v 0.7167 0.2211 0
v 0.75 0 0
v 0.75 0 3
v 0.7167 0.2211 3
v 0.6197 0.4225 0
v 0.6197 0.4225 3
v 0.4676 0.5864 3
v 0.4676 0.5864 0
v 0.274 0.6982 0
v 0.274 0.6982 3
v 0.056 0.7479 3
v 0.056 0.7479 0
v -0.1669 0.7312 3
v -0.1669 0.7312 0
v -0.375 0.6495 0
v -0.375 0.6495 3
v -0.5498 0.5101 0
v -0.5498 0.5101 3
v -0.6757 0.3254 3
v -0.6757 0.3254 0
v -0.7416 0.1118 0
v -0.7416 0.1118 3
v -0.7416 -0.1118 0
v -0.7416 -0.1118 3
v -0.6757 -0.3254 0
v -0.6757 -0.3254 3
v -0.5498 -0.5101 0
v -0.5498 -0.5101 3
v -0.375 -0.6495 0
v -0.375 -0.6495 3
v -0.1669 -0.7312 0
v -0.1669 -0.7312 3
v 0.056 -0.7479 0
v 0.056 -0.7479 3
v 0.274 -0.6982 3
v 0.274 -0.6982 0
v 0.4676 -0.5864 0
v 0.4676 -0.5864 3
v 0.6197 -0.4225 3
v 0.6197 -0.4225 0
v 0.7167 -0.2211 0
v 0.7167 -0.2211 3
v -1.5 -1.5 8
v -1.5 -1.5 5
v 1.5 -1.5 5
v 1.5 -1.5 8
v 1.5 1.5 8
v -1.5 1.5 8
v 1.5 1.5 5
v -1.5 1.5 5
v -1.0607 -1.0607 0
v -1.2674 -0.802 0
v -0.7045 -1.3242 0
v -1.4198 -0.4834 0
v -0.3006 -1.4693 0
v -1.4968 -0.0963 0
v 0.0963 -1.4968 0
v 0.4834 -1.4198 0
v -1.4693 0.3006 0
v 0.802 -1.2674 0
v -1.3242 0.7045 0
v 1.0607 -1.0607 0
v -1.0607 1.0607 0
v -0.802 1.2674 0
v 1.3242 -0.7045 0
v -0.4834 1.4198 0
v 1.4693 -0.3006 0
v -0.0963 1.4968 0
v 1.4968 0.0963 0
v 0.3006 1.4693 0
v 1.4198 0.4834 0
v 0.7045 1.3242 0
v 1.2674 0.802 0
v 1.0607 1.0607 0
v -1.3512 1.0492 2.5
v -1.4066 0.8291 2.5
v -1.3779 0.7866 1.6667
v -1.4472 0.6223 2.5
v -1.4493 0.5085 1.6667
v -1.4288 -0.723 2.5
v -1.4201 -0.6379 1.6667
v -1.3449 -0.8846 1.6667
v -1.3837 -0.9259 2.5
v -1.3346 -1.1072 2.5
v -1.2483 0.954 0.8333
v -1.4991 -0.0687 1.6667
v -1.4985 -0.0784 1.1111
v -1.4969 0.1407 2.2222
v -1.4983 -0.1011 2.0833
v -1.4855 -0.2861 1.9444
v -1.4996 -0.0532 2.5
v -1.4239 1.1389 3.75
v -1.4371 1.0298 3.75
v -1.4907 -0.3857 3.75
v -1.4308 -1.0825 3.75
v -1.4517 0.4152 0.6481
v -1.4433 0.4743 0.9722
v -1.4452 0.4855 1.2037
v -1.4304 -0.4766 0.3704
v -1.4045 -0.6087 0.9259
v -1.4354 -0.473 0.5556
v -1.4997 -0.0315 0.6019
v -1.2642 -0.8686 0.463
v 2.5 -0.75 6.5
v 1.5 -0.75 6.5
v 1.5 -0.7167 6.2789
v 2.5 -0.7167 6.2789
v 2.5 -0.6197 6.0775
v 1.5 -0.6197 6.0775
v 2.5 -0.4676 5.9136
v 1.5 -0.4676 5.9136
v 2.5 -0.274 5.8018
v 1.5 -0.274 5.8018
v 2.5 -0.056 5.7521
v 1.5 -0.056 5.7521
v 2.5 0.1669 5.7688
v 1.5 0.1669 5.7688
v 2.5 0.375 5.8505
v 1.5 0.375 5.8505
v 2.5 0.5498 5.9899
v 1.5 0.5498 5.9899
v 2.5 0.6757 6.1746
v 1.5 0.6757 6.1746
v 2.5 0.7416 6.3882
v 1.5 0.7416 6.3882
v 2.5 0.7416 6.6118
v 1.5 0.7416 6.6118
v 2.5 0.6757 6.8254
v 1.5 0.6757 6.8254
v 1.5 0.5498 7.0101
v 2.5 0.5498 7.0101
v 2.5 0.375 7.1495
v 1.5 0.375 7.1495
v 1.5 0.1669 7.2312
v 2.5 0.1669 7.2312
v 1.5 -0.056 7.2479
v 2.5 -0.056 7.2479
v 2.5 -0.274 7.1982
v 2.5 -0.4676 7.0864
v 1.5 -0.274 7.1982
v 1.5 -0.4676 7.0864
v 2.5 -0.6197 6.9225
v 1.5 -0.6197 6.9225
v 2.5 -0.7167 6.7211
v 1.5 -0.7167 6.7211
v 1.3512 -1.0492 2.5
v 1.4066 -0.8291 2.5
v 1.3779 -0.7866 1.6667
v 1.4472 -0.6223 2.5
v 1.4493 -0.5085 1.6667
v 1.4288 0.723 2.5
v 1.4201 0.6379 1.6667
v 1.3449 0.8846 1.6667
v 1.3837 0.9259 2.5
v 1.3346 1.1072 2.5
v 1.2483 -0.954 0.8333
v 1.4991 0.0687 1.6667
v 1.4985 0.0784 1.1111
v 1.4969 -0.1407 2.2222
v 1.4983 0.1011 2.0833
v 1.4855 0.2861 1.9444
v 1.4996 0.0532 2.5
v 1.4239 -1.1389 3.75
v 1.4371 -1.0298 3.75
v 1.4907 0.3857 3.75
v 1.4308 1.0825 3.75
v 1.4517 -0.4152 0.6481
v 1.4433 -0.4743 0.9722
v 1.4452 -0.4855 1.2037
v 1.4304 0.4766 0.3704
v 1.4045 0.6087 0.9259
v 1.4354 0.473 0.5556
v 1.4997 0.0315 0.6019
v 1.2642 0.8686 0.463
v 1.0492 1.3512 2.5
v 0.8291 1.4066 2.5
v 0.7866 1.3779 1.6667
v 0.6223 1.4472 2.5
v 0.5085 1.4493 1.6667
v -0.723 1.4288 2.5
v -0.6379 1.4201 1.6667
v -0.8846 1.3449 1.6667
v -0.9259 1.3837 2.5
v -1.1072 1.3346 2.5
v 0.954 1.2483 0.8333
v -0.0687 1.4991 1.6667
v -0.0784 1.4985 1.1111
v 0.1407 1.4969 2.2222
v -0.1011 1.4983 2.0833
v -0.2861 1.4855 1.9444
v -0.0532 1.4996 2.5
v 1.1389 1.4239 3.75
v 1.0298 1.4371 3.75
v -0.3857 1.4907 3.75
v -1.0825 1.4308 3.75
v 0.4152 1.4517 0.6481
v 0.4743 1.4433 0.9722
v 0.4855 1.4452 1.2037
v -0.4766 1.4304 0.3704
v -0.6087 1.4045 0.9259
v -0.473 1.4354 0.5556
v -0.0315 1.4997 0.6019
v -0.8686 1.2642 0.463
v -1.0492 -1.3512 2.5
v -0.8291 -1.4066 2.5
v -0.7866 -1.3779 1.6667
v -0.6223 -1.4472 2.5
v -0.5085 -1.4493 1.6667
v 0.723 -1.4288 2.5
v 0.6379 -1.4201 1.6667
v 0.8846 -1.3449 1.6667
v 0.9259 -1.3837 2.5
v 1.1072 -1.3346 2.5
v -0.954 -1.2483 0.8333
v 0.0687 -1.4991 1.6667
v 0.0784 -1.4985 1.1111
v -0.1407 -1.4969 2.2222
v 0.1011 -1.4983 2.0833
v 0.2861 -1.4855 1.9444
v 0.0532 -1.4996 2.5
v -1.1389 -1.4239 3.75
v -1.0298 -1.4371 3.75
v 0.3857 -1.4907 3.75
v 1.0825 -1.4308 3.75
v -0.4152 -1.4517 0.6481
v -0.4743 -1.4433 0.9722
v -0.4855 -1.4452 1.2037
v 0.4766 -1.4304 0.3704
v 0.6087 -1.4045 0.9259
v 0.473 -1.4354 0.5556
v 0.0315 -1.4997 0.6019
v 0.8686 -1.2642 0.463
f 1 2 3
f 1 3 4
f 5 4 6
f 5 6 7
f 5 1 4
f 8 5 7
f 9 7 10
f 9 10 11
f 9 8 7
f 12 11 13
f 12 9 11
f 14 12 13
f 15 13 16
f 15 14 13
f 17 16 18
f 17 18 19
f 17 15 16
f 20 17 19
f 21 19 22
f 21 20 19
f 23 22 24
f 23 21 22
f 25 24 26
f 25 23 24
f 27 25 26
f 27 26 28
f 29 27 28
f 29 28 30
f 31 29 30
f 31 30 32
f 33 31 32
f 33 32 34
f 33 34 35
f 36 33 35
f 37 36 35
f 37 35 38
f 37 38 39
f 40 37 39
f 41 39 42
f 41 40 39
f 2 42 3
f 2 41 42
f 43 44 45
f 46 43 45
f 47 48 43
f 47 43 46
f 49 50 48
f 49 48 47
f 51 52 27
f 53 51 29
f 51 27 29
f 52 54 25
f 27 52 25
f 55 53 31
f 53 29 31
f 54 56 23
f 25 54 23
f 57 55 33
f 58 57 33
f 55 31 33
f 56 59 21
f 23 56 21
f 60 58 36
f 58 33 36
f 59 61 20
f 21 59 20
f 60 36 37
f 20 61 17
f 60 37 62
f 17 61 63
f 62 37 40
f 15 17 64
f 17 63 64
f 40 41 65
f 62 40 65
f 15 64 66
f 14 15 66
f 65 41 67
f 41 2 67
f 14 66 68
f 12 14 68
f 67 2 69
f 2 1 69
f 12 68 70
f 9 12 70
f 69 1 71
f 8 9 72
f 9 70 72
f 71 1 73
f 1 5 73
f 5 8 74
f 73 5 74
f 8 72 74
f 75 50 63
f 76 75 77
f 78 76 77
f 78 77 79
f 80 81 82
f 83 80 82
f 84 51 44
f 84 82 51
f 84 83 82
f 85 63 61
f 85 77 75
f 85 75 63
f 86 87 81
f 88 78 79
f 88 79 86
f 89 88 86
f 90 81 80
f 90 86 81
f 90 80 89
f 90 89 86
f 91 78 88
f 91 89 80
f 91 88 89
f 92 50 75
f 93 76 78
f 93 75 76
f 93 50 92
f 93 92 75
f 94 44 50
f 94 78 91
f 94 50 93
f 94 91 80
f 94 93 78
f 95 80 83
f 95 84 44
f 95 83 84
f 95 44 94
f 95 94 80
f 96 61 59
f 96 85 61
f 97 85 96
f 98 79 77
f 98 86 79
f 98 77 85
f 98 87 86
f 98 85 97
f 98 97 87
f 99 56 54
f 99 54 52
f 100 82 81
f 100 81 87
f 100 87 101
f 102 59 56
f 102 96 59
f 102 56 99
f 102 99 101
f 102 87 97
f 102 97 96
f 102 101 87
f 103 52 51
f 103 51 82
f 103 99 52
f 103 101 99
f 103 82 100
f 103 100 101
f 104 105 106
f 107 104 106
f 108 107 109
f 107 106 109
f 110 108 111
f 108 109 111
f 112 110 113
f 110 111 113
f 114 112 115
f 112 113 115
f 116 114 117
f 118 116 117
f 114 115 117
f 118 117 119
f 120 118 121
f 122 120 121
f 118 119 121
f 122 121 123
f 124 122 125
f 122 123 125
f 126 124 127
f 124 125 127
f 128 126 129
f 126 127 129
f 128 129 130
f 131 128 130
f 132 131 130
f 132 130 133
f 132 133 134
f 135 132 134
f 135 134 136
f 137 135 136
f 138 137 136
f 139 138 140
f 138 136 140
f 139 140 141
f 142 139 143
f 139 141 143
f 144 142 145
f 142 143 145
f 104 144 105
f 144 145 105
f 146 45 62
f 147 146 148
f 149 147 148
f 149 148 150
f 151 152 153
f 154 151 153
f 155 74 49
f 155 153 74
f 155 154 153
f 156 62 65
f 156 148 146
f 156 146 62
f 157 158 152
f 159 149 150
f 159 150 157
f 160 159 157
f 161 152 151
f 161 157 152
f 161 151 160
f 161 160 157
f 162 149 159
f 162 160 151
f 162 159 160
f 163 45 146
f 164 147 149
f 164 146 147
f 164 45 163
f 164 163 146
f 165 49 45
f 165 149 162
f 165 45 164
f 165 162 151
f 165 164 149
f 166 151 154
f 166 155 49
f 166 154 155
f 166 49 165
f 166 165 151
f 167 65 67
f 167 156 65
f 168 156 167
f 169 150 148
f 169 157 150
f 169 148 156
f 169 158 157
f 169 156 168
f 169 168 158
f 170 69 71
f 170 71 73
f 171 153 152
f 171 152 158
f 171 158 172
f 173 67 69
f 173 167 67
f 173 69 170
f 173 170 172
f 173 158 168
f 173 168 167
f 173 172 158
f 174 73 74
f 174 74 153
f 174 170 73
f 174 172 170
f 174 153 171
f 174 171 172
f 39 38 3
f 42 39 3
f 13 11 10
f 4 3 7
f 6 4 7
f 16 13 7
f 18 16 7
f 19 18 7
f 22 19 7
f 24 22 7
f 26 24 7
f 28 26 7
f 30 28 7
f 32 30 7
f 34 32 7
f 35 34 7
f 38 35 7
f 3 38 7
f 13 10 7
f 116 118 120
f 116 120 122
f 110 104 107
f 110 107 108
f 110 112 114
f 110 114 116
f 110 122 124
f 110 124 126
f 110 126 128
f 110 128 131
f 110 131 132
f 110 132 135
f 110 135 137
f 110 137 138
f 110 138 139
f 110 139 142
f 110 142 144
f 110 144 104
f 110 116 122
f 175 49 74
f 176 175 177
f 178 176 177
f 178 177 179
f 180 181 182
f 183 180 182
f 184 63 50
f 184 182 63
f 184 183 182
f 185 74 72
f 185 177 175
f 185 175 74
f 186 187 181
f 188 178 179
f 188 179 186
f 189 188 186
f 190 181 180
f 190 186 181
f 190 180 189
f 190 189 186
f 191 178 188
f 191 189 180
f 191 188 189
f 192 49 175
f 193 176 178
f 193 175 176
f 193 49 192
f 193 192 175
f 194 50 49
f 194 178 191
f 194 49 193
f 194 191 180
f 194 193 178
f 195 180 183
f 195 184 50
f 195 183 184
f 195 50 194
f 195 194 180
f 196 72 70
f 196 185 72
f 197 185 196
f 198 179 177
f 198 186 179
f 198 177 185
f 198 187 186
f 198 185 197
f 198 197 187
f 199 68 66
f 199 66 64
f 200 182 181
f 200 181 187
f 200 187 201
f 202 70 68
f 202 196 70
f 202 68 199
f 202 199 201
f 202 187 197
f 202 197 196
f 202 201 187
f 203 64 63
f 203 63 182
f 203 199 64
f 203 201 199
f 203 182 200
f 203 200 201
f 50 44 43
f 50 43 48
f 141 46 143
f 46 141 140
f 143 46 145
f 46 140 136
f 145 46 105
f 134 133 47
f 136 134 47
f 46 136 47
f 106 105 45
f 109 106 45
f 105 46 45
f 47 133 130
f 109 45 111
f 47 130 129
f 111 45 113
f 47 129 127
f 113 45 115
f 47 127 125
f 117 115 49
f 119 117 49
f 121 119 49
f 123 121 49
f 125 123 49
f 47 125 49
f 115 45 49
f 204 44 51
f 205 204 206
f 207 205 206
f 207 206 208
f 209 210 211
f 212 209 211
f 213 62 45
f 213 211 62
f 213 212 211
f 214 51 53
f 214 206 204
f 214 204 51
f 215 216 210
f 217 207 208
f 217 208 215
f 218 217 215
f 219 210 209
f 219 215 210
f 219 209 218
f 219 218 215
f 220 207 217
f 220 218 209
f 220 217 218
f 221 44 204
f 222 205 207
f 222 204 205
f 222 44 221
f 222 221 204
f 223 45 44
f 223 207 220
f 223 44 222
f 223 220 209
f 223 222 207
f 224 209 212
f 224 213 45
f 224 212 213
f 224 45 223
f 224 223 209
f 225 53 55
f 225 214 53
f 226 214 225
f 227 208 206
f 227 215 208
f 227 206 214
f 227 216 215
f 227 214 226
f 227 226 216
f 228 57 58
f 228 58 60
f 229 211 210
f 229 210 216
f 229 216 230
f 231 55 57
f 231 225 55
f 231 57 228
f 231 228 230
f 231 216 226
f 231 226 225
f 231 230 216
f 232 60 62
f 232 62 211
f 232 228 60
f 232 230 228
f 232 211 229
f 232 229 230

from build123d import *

# Parameters (mm, degrees)
SKETCH1_8_R         = 0.75
CUT_EXTRUDE3_DEPTH  = 3
SKETCH3_2_W         = 3
SKETCH3_2_H         = 3
BOSS_EXTRUDE3_DEPTH = 3
SKETCH5_R           = 0.75
BOSS_EXTRUDE4_DEPTH = 1


with BuildPart() as part:
    # Loft2: read off the stored shape, not the designer's step
    # Loft2: loft between two sections, ruled curve by curve
    loft2_from = [
        Edge.make_bspline([(1.060660172, -1.060660172, 0), (1.185660172, -0.935660172, 0), (1.297737894, -0.778019164, 0), (1.45548774, -0.413512879, 0), (1.5, -0.207106781, 0), (1.5, 0.207106781, 0), (1.45548774, 0.413512879, 0), (1.297737894, 0.778019164, 0), (1.185660172, 0.935660172, 0), (1.060660172, 1.060660172, 0)], [0, 0, 0, 0, 0.25, 0.25, 0.5, 0.5, 0.75, 0.75, 1, 1, 1, 1], 3),
        Edge.make_bspline([(1.060660172, 1.060660172, 0), (0.935660172, 1.185660172, 0), (0.778019164, 1.297737894, 0), (0.413512879, 1.45548774, 0), (0.207106781, 1.5, 0), (-0.207106781, 1.5, 0), (-0.413512879, 1.45548774, 0), (-0.778019164, 1.297737894, 0), (-0.935660172, 1.185660172, 0), (-1.060660172, 1.060660172, 0)], [0, 0, 0, 0, 0.25, 0.25, 0.5, 0.5, 0.75, 0.75, 1, 1, 1, 1], 3),
        Edge.make_bspline([(-1.060660172, -1.060660172, 0), (-0.935660172, -1.185660172, 0), (-0.778019164, -1.297737894, 0), (-0.413512879, -1.45548774, 0), (-0.207106781, -1.5, 0), (0.207106781, -1.5, 0), (0.413512879, -1.45548774, 0), (0.778019164, -1.297737894, 0), (0.935660172, -1.185660172, 0), (1.060660172, -1.060660172, 0)], [0, 0, 0, 0, 0.25, 0.25, 0.5, 0.5, 0.75, 0.75, 1, 1, 1, 1], 3),
        Edge.make_bspline([(-1.060660172, 1.060660172, 0), (-1.185660172, 0.935660172, 0), (-1.297737894, 0.778019164, 0), (-1.45548774, 0.413512879, 0), (-1.5, 0.207106781, 0), (-1.5, -0.207106781, 0), (-1.45548774, -0.413512879, 0), (-1.297737894, -0.778019164, 0), (-1.185660172, -0.935660172, 0), (-1.060660172, -1.060660172, 0)], [0, 0, 0, 0, 0.25, 0.25, 0.5, 0.5, 0.75, 0.75, 1, 1, 1, 1], 3),
    ]
    loft2_to = [
        Edge.make_bspline([(1.5, -1.5, 5), (1.5, -1.25, 5), (1.5, -1, 5), (1.5, -0.5, 5), (1.5, -0.25, 5), (1.5, 0.25, 5), (1.5, 0.5, 5), (1.5, 1, 5), (1.5, 1.25, 5), (1.5, 1.5, 5)], [0, 0, 0, 0, 0.25, 0.25, 0.5, 0.5, 0.75, 0.75, 1, 1, 1, 1], 3),
        Edge.make_bspline([(1.5, 1.5, 5), (1.25, 1.5, 5), (1, 1.5, 5), (0.5, 1.5, 5), (0.25, 1.5, 5), (-0.25, 1.5, 5), (-0.5, 1.5, 5), (-1, 1.5, 5), (-1.25, 1.5, 5), (-1.5, 1.5, 5)], [0, 0, 0, 0, 0.25, 0.25, 0.5, 0.5, 0.75, 0.75, 1, 1, 1, 1], 3),
        Edge.make_bspline([(-1.5, -1.5, 5), (-1.25, -1.5, 5), (-1, -1.5, 5), (-0.5, -1.5, 5), (-0.25, -1.5, 5), (0.25, -1.5, 5), (0.5, -1.5, 5), (1, -1.5, 5), (1.25, -1.5, 5), (1.5, -1.5, 5)], [0, 0, 0, 0, 0.25, 0.25, 0.5, 0.5, 0.75, 0.75, 1, 1, 1, 1], 3),
        Edge.make_bspline([(-1.5, 1.5, 5), (-1.5, 1.25, 5), (-1.5, 1, 5), (-1.5, 0.5, 5), (-1.5, 0.25, 5), (-1.5, -0.25, 5), (-1.5, -0.5, 5), (-1.5, -1, 5), (-1.5, -1.25, 5), (-1.5, -1.5, 5)], [0, 0, 0, 0, 0.25, 0.25, 0.5, 0.5, 0.75, 0.75, 1, 1, 1, 1], 3),
    ]
    loft2 = Solid(Shell([*[Face.make_surface_from_curves(loft2_from[k], loft2_to[k]) for k in range(4)], Face(Wire(loft2_from)), Face(Wire(loft2_to))]))
    add(loft2)

    # Sketch1<8> → Cut-Extrude3 (cut)
    with BuildSketch(Plane.XY):
        Circle(SKETCH1_8_R)
    extrude(amount=CUT_EXTRUDE3_DEPTH, mode=Mode.SUBTRACT)

    # Sketch3<2> → Boss-Extrude3 (add)
    with BuildSketch(Plane.XY.offset(5)):
        Rectangle(SKETCH3_2_W, SKETCH3_2_H)
    extrude(amount=BOSS_EXTRUDE3_DEPTH)

    # Sketch5 → Boss-Extrude4 (add)
    with BuildSketch(Plane(origin=(1.5, 0, 0), x_dir=(0, 0, -1), z_dir=(1, 0, 0))):
        with Locations(Location((-6.5, 0, 0), (0, 0, 270))):
            Circle(SKETCH5_R)
    extrude(amount=BOSS_EXTRUDE4_DEPTH)


solid = part.part
